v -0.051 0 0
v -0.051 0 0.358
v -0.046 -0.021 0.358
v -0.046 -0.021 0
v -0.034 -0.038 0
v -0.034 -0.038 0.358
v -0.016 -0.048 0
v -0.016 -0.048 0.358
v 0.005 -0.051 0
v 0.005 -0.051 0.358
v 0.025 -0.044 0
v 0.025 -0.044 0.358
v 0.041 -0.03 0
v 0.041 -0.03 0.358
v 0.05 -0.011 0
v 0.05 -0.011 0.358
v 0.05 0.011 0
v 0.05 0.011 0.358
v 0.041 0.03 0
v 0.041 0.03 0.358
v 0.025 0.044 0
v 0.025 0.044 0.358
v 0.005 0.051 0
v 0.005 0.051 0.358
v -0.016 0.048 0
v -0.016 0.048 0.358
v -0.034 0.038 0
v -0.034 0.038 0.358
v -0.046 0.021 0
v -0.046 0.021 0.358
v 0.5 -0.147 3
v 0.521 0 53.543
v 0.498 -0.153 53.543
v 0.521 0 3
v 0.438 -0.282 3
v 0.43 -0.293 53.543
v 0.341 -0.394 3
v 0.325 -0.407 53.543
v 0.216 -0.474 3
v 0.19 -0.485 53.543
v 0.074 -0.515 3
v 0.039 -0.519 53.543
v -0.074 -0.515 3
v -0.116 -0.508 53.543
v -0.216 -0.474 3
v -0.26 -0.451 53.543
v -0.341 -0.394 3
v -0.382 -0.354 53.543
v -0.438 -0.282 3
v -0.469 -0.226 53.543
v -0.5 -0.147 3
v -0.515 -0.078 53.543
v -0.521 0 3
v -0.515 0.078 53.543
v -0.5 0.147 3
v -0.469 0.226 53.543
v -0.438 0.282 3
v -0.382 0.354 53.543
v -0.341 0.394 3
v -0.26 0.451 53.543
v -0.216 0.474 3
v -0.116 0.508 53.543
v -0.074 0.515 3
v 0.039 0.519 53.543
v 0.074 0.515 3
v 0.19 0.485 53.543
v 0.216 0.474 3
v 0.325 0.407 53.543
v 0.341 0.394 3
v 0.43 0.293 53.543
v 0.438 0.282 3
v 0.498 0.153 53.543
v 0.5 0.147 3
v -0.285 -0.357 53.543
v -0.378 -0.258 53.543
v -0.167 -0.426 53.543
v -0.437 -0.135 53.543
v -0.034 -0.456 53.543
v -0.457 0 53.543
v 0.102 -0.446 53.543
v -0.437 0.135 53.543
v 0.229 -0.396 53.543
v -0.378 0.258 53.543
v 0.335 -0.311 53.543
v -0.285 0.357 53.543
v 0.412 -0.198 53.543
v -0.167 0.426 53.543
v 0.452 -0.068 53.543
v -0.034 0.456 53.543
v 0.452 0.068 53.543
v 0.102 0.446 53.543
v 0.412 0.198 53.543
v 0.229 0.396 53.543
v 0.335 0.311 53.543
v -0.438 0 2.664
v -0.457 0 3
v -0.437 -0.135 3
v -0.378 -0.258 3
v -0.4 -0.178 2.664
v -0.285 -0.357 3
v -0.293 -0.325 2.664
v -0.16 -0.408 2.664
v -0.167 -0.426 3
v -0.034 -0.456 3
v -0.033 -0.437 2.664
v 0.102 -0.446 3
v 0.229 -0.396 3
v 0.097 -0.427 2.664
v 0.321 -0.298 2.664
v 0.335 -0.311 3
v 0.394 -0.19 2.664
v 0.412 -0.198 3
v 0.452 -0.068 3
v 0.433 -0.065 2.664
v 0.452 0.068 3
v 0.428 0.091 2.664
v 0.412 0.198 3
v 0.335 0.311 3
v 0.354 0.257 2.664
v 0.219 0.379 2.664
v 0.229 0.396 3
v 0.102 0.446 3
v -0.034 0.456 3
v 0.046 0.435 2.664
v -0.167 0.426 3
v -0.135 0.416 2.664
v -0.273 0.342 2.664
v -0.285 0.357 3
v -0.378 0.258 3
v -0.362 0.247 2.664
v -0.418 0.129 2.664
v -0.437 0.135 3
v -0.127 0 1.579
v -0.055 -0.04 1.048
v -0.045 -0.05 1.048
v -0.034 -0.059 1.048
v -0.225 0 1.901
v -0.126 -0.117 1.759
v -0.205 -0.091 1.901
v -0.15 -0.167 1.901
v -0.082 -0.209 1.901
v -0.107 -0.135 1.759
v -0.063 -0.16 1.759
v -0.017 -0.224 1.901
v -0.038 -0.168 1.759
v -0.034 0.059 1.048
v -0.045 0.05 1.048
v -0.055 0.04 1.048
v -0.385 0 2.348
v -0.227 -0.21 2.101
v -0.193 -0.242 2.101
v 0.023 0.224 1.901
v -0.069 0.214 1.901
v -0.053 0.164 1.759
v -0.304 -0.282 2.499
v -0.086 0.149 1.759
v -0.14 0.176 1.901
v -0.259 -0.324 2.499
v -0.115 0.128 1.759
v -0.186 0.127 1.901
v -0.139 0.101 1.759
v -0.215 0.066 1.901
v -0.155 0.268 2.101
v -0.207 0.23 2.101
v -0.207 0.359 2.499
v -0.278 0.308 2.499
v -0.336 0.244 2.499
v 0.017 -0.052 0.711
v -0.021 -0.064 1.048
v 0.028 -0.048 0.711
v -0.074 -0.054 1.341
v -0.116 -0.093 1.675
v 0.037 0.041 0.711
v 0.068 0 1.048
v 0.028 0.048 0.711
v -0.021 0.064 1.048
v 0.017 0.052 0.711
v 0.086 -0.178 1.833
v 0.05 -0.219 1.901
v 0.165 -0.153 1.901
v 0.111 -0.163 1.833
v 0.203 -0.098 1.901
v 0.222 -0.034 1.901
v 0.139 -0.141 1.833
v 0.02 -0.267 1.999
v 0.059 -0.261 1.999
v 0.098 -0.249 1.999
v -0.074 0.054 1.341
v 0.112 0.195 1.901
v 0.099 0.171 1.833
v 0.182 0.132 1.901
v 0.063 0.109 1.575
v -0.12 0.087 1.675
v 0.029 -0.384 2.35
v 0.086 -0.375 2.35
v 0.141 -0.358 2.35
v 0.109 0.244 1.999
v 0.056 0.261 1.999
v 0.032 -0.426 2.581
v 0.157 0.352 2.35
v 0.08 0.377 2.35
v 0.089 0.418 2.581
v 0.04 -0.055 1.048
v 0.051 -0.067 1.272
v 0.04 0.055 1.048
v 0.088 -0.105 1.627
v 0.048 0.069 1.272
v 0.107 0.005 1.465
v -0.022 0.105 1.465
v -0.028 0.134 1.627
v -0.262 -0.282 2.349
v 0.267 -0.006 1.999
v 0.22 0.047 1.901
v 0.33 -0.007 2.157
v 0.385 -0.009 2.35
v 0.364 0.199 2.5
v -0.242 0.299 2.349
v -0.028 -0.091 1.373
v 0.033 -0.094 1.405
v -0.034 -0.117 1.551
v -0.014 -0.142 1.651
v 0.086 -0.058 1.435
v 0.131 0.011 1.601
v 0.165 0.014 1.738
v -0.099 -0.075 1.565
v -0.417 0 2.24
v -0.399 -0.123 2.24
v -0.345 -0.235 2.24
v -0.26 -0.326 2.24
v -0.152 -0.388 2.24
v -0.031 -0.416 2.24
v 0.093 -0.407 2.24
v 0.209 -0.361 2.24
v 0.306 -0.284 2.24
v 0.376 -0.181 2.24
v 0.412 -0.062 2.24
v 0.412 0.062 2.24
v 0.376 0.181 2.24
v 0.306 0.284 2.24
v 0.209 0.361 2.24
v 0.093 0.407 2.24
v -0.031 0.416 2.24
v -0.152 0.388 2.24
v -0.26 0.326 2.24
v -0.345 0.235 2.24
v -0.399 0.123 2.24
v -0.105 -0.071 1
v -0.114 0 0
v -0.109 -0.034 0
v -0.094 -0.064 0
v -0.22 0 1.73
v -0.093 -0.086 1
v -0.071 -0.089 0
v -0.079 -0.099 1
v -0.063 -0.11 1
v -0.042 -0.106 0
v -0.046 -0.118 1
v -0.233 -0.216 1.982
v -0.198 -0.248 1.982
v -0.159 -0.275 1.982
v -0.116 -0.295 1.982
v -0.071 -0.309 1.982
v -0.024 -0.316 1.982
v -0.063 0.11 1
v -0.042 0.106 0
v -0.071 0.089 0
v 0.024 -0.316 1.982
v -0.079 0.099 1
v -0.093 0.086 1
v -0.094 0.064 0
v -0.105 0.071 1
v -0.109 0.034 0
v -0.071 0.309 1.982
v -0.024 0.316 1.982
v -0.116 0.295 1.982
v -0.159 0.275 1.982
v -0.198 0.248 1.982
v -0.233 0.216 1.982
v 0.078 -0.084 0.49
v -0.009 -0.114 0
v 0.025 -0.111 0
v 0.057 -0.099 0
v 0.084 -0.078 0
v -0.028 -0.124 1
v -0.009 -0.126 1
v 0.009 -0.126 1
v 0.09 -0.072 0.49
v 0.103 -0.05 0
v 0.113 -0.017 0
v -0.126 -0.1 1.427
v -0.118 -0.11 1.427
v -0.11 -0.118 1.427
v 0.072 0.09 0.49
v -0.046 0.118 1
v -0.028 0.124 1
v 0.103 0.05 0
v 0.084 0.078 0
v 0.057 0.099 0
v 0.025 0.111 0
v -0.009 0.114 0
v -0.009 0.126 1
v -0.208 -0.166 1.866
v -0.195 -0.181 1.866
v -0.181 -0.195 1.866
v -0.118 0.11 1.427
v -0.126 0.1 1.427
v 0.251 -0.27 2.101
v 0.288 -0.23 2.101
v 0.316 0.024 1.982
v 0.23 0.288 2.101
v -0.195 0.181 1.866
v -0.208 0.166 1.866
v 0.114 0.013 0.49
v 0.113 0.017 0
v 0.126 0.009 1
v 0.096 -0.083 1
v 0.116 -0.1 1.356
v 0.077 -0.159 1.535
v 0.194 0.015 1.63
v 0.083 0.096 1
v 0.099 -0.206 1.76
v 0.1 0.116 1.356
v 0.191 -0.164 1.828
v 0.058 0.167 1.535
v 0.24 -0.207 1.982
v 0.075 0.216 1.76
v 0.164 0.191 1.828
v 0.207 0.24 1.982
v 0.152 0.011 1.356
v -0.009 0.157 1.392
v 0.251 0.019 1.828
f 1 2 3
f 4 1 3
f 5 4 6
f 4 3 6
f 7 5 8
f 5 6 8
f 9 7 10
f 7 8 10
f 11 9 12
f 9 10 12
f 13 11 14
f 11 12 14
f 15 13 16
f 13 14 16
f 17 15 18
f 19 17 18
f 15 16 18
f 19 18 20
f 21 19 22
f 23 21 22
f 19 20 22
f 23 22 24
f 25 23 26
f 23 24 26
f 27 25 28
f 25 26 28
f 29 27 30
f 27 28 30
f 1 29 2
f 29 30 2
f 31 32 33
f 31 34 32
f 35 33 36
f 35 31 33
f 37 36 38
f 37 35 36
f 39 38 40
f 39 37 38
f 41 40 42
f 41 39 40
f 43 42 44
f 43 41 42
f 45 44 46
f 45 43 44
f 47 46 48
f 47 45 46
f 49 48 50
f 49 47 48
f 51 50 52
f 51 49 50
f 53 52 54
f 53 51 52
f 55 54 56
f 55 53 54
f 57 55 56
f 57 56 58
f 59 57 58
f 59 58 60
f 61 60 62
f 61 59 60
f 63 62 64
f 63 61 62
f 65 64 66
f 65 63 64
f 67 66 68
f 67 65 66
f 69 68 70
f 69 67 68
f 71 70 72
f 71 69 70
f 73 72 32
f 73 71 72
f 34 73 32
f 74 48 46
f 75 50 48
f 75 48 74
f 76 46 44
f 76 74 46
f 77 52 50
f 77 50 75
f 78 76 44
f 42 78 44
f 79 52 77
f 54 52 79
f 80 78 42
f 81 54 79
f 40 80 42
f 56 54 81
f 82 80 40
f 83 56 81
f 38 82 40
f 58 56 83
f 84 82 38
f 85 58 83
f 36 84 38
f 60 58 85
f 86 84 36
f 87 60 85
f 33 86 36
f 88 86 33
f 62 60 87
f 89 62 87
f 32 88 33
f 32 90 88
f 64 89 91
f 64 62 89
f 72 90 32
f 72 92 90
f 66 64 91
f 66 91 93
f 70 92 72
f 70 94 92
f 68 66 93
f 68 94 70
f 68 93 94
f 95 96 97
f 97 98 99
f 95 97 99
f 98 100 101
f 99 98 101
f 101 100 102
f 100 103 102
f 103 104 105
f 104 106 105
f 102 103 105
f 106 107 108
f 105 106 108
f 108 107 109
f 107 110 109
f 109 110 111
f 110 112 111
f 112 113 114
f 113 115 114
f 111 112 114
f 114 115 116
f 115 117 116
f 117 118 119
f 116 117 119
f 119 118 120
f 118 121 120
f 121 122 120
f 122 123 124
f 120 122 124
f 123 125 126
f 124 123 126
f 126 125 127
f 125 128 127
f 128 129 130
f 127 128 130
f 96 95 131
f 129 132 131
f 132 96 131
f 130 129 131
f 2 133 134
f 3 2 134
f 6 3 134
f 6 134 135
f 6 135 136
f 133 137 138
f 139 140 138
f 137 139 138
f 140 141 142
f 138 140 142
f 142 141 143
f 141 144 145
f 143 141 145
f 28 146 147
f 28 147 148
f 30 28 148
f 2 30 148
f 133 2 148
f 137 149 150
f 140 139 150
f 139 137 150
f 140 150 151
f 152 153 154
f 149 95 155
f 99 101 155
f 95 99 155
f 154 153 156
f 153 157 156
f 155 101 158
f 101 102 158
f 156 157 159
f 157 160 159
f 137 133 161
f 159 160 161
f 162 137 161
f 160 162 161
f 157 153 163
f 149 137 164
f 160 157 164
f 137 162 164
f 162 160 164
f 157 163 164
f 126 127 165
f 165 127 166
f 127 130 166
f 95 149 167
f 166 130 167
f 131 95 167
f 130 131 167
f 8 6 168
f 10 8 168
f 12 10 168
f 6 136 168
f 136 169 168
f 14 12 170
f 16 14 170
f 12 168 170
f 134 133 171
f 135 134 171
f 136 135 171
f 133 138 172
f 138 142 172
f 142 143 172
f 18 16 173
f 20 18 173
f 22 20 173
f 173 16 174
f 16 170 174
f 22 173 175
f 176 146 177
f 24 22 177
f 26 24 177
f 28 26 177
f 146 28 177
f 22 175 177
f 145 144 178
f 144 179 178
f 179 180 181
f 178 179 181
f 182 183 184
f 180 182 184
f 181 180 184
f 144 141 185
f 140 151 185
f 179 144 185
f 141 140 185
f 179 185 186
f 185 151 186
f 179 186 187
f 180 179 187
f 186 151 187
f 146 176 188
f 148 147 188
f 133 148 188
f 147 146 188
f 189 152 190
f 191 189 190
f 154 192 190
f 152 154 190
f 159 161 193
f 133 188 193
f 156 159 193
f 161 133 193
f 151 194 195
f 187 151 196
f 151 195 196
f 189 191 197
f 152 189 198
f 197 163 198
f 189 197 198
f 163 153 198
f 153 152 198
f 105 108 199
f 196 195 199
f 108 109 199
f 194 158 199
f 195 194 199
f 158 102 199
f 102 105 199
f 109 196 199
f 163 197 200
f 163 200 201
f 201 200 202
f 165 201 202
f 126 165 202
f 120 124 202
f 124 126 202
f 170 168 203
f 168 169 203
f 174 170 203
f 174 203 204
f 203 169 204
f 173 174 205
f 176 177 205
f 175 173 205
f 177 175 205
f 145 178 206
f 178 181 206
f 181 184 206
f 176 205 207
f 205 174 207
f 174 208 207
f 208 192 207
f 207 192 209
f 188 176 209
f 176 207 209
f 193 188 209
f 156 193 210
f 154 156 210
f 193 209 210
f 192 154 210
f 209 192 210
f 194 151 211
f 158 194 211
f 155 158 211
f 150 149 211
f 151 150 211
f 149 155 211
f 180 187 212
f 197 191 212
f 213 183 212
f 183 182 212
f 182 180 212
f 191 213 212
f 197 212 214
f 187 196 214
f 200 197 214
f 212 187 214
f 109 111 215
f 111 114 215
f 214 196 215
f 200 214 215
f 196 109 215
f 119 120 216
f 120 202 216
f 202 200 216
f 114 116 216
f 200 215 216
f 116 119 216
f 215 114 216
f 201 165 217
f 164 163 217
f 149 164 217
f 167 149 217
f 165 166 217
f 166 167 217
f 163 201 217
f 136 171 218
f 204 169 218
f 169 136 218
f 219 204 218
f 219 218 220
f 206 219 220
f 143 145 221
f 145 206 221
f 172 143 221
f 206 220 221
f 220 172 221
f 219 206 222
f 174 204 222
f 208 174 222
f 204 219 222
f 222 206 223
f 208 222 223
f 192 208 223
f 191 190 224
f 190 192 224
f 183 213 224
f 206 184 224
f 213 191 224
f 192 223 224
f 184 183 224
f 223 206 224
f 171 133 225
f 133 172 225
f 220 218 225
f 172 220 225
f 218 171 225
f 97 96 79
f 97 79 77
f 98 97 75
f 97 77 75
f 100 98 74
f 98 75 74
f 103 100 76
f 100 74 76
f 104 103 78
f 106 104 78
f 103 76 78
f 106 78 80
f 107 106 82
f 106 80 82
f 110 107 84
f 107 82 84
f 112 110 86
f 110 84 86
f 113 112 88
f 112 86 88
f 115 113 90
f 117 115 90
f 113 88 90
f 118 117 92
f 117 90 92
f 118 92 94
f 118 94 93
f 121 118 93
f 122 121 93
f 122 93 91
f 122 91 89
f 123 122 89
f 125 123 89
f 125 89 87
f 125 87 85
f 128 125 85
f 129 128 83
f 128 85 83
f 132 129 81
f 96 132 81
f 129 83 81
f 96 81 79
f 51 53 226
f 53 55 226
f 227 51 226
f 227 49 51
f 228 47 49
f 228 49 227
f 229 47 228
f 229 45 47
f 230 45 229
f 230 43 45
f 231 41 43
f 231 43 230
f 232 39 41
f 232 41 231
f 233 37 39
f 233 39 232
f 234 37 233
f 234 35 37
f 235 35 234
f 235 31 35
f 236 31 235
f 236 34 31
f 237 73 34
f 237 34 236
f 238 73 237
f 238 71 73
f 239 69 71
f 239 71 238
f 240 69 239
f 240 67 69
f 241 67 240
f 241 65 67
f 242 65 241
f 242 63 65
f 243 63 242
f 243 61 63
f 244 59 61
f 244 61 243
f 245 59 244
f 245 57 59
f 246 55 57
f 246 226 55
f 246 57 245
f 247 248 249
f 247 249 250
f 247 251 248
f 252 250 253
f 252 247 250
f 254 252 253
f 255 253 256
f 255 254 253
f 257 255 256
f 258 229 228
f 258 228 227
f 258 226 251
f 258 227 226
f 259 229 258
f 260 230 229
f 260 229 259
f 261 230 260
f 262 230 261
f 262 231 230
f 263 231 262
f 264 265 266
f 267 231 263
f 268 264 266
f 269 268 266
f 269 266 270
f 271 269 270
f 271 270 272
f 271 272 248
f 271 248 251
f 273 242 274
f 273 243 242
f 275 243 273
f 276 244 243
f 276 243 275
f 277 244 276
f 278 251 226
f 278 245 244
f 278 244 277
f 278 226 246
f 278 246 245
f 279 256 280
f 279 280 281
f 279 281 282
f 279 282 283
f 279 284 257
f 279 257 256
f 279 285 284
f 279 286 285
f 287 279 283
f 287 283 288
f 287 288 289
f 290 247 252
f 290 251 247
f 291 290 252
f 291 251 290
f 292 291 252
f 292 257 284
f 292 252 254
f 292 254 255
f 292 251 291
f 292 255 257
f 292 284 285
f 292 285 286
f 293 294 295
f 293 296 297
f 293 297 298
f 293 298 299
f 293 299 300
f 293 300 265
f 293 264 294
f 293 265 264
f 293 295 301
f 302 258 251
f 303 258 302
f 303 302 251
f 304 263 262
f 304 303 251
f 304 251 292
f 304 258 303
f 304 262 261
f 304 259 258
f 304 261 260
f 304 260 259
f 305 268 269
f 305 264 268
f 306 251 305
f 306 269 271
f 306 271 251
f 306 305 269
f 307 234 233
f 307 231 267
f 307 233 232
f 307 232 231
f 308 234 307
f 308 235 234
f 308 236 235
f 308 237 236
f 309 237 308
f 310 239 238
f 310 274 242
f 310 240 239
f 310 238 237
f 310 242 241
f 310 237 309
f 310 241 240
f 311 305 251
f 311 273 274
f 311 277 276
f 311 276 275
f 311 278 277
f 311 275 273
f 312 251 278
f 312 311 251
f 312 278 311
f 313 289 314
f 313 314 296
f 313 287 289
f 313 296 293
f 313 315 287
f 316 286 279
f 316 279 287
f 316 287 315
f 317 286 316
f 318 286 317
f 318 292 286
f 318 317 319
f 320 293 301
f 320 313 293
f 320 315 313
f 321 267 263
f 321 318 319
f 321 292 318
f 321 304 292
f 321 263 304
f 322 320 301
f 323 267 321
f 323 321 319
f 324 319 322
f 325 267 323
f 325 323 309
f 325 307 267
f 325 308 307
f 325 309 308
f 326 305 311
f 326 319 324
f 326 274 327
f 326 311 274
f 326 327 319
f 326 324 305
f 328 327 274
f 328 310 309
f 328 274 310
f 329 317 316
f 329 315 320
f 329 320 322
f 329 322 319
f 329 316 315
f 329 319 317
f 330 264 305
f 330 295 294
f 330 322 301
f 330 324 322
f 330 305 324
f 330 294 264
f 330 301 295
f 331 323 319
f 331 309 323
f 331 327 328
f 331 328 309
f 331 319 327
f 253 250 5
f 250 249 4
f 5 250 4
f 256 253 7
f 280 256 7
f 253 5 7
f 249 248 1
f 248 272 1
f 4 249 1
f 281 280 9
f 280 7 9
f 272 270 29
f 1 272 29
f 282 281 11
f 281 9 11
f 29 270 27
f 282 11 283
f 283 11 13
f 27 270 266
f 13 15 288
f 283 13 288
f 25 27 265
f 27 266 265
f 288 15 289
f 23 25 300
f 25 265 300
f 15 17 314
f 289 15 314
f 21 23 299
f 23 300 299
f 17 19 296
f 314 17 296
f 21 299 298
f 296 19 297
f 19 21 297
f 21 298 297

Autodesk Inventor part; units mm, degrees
ref_plane "YZ Plane" through (0, 0, 0) normal (1, 0, 0) x (0, 1, 0)
ref_plane "XZ Plane" through (0, 0, 0) normal (0, 1, 0) x (-1, 0, 0)
ref_plane "XY Plane" through (0, 0, 0) normal (0, 0, 1) x (1, 0, 0)
sketch "Sketch1" plane through (0, 0, 0) normal (0, 0, 1) x (1, 0, 0)
  circle A0 centre (0, 0) radius 0.5207
  dimension "d0" = 1.0414
sketch "Sketch1 outline for Extrusion1" plane through (0, 0, 0) normal (0, 0, 1) x (1, 0, 0)
  circle A0 centre (0, 0) radius 0.5207
extrude "Extrusion1" add sketch "Sketch1 outline for Extrusion1" along normal blind 53.5432
sketch "Sketch3" plane through (0, 0, 0) normal (0, 1, 0) x (-1, 0, 0)
  line L0 (0, -10.70864) -> (0, 64.25184)
  line L1 (-0.5207, 0) -> (0.5207, 0)
  line L2 (-0.5207, 0) -> (-0.5207, 53.5432)
  line L3 (0.5207, 0) -> (0.5207, 53.5432)
  line L4 (0.4572, 0) -> (0.4572, 53.5432)
  line L5 (-0.5207, 53.5432) -> (0.5207, 53.5432)
  line L6 (0.0508, 0) -> (0, 0)
  line L7 (0, 0) -> (0, 3)
  line L8 (0, 3) -> (0.0508, 3)
  line L9 (0.0508, 3) -> (0.0508, 0)
  line L10 (0, 0) -> (0.1143, 0)
  line L11 (0.1143, 0) -> (0.1143, 3)
  line L12 (0.1143, 3) -> (0, 3)
  line L13 (0, 3) -> (0, 0)
  line L14 (0, 3) -> (0.5207, 3)
  spline S0 degree 4 poles (0.1143, 0) (0.1143, 0.51605) (0.092329, 2.145399) (0.396023, 1.739504) (0.5207, 2.685768) (0.5207, 3) knots 0 0 0 0 0 0.53463216 1 1 1 1 1
  spline S1 degree 4 poles (0.0508, 0) (0.0508, 0.513555) (0.032096, 2.101955) (0.338843, 1.754797) (0.4572, 2.685063) (0.4572, 3) knots 0 0 0 0 0 0.53394472 1 1 1 1 1
  line L15 (0, 54.462693) -> (0.4572, 54.462693)
  line L16 (0.4572, 54.462693) -> (0.4572, 3)
  line L17 (0.4572, 3) -> (0, 3)
  line L18 (0, 3) -> (0, 54.462693)
  point P0 (0.390046, 2.157892)
  point P1 (0.22686, 1.754843)
  point P2 (0.164132, 1.732429)
  point P3 (0.330809, 2.160123)
  point P4 (0.2286, 54.462693)
  dimension "d7" = 3
  dimension "d8" = 0.0508
  dimension "d17" = 0.0635
  dimension "d18" = 0.0635
sketch "Sketch3 outline for Revolution1" plane through (0, 0, 0) normal (0, 1, 0) x (-1, 0, 0)
  spline S0 degree 4 poles (0.1143, 0) (0.1143, 0.51605) (0.092329, 2.145399) (0.396023, 1.739504) (0.5207, 2.685768) (0.5207, 3) knots 0 0 0 0 0 0.53463216 1 1 1 1 1
  line L0 (0.5207, 0) -> (0.5207, 3)
  line L1 (0.4572, 0) -> (0.5207, 0)
  line L2 (0.1143, 0) -> (0.4572, 0)
revolve "Revolution1" cut sketch "Sketch3 outline for Revolution1" angle 360 about axis through (0, 0, -10) along (0, 0, 1)
sketch "Sketch3 outline for Revolution2" plane through (0, 0, 0) normal (0, 1, 0) x (-1, 0, 0)
  line L0 (0, 0) -> (0.0508, 0)
  line L1 (0.0508, 0) -> (0.0508, 0.358012)
  spline S0 degree 4 poles (0.0508, 0.358012) (0.052632, 0.873182) (0.082062, 2.052843) (0.348737, 1.832558) (0.4572, 2.685063) (0.4572, 3) knots 0 0 0 0 0 0.49143364 1 1 1 1 1
  line L2 (0.4572, 3) -> (0, 3)
  line L3 (0, 3) -> (0, 0)
revolve "Revolution2" cut sketch "Sketch3 outline for Revolution2" angle 360 about axis through (0, 0, -10) along (0, 0, 1)
sketch "Sketch3 outline for Revolution3" plane through (0, 0, 0) normal (0, 1, 0) x (-1, 0, 0)
  line L0 (0, 3) -> (0.4572, 3)
  line L1 (0, 54.462693) -> (0, 3)
  line L2 (0.4572, 54.462693) -> (0, 54.462693)
  line L3 (0.4572, 3) -> (0.4572, 54.462693)
revolve "Revolution3" cut sketch "Sketch3 outline for Revolution3" angle 360 about axis through (0, 0, -10) along (0, 0, 1)
properties part number "pipette"
